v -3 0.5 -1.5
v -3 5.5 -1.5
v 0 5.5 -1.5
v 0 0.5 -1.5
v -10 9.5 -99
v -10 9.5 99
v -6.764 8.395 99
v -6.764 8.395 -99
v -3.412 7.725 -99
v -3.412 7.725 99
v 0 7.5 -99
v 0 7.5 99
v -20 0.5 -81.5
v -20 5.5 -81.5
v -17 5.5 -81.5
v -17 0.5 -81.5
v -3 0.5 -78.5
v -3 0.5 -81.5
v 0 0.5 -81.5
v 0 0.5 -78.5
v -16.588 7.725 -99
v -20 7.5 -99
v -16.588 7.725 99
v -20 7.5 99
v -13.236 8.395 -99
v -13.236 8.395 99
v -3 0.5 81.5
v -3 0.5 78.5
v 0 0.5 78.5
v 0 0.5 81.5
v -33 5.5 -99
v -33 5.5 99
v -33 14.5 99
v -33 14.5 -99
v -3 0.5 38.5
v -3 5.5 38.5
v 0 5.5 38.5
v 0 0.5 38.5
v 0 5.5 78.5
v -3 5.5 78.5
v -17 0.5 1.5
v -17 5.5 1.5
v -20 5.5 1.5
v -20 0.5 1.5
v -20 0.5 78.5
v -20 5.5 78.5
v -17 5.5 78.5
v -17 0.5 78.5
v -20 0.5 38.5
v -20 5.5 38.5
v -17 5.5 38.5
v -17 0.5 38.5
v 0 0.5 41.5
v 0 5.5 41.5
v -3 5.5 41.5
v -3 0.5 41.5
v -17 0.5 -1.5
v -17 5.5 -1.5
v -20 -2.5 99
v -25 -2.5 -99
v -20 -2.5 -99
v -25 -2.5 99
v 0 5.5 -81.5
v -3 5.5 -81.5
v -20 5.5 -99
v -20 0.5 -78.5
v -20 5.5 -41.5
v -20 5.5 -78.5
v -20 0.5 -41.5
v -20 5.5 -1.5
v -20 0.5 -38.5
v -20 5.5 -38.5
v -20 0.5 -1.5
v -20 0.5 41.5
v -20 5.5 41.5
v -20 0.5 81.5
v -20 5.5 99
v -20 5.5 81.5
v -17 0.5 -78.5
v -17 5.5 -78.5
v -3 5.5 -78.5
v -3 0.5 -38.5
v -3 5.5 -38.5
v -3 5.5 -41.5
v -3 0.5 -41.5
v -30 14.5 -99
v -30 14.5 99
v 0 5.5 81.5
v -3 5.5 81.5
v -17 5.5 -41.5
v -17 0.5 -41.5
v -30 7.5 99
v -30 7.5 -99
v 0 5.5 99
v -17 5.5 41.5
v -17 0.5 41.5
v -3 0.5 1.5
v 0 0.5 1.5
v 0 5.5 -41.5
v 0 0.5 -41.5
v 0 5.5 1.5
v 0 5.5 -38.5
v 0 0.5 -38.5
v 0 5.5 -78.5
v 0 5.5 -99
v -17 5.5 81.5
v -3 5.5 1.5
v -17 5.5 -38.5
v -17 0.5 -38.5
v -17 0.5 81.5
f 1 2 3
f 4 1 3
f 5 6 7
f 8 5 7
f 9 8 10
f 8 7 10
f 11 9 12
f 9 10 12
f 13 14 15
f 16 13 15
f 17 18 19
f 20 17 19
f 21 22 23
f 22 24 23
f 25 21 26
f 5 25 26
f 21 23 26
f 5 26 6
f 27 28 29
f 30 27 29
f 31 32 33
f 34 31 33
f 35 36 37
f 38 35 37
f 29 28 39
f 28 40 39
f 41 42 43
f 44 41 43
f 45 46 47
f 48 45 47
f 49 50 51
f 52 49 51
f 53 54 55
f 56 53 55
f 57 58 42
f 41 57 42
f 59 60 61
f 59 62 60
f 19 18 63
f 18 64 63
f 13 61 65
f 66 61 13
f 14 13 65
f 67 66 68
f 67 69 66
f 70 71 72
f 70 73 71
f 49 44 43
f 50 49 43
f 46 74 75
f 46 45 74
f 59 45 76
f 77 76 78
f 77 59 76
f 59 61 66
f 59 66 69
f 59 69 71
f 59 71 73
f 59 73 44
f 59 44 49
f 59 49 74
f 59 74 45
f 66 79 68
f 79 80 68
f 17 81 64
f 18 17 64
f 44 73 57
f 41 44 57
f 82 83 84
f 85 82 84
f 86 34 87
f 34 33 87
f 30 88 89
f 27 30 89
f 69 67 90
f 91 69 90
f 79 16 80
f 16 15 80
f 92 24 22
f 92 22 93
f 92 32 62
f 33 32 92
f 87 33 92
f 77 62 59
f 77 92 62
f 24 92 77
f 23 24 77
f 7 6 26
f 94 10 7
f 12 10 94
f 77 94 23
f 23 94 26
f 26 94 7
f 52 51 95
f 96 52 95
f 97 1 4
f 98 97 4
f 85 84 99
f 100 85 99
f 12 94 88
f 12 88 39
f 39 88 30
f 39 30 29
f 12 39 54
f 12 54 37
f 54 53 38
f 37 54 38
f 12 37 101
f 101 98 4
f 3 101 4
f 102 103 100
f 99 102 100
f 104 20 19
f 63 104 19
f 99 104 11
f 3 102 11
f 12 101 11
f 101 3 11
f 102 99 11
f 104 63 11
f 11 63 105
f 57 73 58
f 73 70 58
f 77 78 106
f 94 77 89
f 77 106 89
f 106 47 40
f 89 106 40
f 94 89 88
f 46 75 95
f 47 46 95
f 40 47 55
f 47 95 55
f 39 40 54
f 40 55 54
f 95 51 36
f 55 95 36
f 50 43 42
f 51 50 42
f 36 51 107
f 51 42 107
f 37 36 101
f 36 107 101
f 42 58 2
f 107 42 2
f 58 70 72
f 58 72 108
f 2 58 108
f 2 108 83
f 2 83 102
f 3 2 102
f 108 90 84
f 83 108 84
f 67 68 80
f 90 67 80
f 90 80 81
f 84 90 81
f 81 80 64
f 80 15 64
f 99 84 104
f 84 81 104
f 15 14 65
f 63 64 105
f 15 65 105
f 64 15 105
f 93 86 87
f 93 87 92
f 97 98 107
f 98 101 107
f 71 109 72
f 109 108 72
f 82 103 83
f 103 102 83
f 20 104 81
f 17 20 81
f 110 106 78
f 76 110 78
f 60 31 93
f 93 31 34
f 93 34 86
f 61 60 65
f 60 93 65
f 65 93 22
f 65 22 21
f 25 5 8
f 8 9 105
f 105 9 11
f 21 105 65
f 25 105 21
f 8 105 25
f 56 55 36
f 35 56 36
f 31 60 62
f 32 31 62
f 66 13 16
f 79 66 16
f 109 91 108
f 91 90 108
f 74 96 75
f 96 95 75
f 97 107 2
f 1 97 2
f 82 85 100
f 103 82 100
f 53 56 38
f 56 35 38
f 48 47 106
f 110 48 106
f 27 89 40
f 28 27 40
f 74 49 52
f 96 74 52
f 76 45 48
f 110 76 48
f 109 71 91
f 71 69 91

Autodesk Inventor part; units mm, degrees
ref_plane "YZ Plane" through (0, 0, 0) normal (1, 0, 0) x (0, 1, 0)
ref_plane "XZ Plane" through (0, 0, 0) normal (0, 1, 0) x (-1, 0, 0)
ref_plane "XY Plane" through (0, 0, 0) normal (0, 0, 1) x (1, 0, 0)
sketch "スケッチ1" plane through (0, 0, 0) normal (0, 1, 0) x (-1, 0, 0)
  line L0 (0, 99) -> (20, 99)
  line L1 (20, 99) -> (20, -99)
  line L2 (20, -99) -> (0, -99)
  line L3 (0, -99) -> (0, 99)
  line L4 (20, -99) -> (20, -109)
  line L5 (20, -109) -> (9, -109)
  line L6 (9, -109) -> (11, -99)
  line L7 (10.5, 99) -> (8.5, 88.5)
  line L8 (8.5, 88.5) -> (20, 88.5)
  point P0 (0, 0)
  point P1 (0, 0)
  point P2 (10, -99)
  point P3 (10, 99)
  dimension "d0" = 198
  dimension "d1" = 20
  dimension "d4" = 10
  dimension "d5" = 1
  dimension "d6" = 1
  dimension "d7" = 10.5
  dimension "d8" = 1.5
  dimension "d9" = 0.5
extrude "押し出し1" add sketch "スケッチ1" along normal blind 5.5 contours L0 L7 L8 L1 L2 L3 | L2 L4 L5 L6
sketch "スケッチ2" plane through (0, 5.5, 0) normal (0, 1, 0) x (1, 0, 0)
  line L0 (-20, 109) -> (-20, -88.5) projected
  line L1 (-20, -1.5) -> (-17, -1.5)
  line L2 (-17, -1.5) -> (-17, 1.5)
  line L3 (-17, 1.5) -> (-20, 1.5)
  line L4 (-20, 1.5) -> (-20, -1.5)
  line L5 (0, -99) -> (0, 99) projected
  line L6 (0, -1.5) -> (-3, -1.5)
  line L7 (-3, -1.5) -> (-3, 1.5)
  line L8 (-3, 1.5) -> (0, 1.5)
  line L9 (0, 1.5) -> (0, -1.5)
  point P0 (0, 0)
  point P1 (-17, 0)
  point P2 (0, 0)
  point P3 (0, 1.5)
  dimension "d10" = 3
  dimension "d11" = 3
extrude "押し出し2" cut sketch "スケッチ2" against normal through all
pattern_linear "矩形状パターン1" count 3 spacing 40 along (0, 0, -1) count 3 spacing 40 along (0, 0, 1) of "押し出し2"
sketch "スケッチ3" plane through (0, 5.5, 0) normal (0, 1, 0) x (1, 0, 0)
  line L0 (-20, -88.5) -> (-8.5, -88.5) projected
  line L1 (-20, -99) -> (0, -99)
  line L2 (0, -99) -> (0, 99)
  line L3 (-20, 109) -> (-20, -88.4991)
  line L4 (-20, -38.5) -> (-17, -38.5) projected
  line L5 (-17, -38.5) -> (-17, -41.5) projected
  line L6 (-17, -41.5) -> (-20, -41.5) projected
  line L7 (-20, -41.5) -> (-20, -78.5) projected
  line L8 (-20, -78.5) -> (-17, -78.5) projected
  line L9 (-17, -78.5) -> (-17, -81.5) projected
  line L10 (-17, -81.5) -> (-20, -81.5) projected
  line L11 (-20, -81.5) -> (-20, -88.5) projected
  line L12 (-20, -88.5) -> (-8.5, -88.5) projected
  line L13 (-8.5, -88.5) -> (-10.5, -99)
  line L14 (-10.5, -99) -> (0, -99) projected
  line L15 (0, -99) -> (0, -81.5) projected
  line L16 (0, -81.5) -> (-3, -81.5) projected
  line L17 (-3, -81.5) -> (-3, -78.5) projected
  line L18 (-3, -78.5) -> (0, -78.5) projected
  line L19 (0, -78.5) -> (0, -41.5) projected
  line L20 (0, -41.5) -> (-3, -41.5) projected
  line L21 (-3, -41.5) -> (-3, -38.5) projected
  line L22 (-3, -38.5) -> (0, -38.5) projected
  line L23 (0, -38.5) -> (0, -1.5) projected
  line L24 (0, -1.5) -> (-3, -1.5) projected
  line L25 (-3, -1.5) -> (-3, 1.5) projected
  line L26 (-3, 1.5) -> (0, 1.5) projected
  line L27 (0, 1.5) -> (0, 38.5) projected
  line L28 (0, 38.5) -> (-3, 38.5) projected
  line L29 (-3, 38.5) -> (-3, 41.5) projected
  line L30 (-3, 41.5) -> (0, 41.5) projected
  line L31 (0, 41.5) -> (0, 78.5) projected
  line L32 (0, 78.5) -> (-3, 78.5) projected
  line L33 (-3, 78.5) -> (-3, 81.5) projected
  line L34 (-3, 81.5) -> (0, 81.5) projected
  line L35 (0, 81.5) -> (0, 99) projected
  line L36 (-9, 109) -> (-20, 109) projected
  line L37 (-20, 109) -> (-20, 81.5) projected
  line L38 (-20, 81.5) -> (-17, 81.5) projected
  line L39 (-17, 81.5) -> (-17, 78.5) projected
  line L40 (-17, 78.5) -> (-20, 78.5) projected
  line L41 (-20, 78.5) -> (-20, 41.5) projected
  line L42 (-20, 41.5) -> (-17, 41.5) projected
  line L43 (-17, 41.5) -> (-17, 38.5) projected
  line L44 (-17, 38.5) -> (-20, 38.5) projected
  line L45 (-20, 38.5) -> (-20, 1.5) projected
  line L46 (-20, 1.5) -> (-17, 1.5) projected
  line L47 (-17, 1.5) -> (-17, -1.5) projected
  line L48 (-17, -1.5) -> (-20, -1.5) projected
  line L49 (-20, -1.5) -> (-20, -38.5) projected
  line L50 (-20, 109) -> (-20, 81.5) projected
  line L51 (-20, -99) -> (-20, -88.4991)
  line L52 (-9, 109) -> (0, 109)
  line L53 (0, 99) -> (0, 109)
  line L54 (0, 99) -> (-20, 99)
  point P0 (0, 0)
  point P1 (-11, 99)
  point P2 (0, -78.5)
  point P3 (0, -38.5)
  point P4 (0, 41.5)
  point P5 (0, 81.5)
  point P6 (-20, -88.4991)
extrude "押し出し3" cut sketch "スケッチ3" against normal through all contours L3 L10 L9 L8 L6 L5 L4 L48 L47 L46 L44 L43 L42 L40 L39 L38 L54 L2 L34 L33 L32 L30 L29 L28 L26 L25 L24 L22 L21 L20 L18 L17 L16 L1 L13 L0 | L3 L8 L9 L10 | L3 L4 L5 L6 | L16 L17 L18 L2 | L3 L46 L47 L48 | L20 L21 L22 L2 | L3 L42 L43 L44 | L24 L25 L26 L2 | L3 L38 L39 L40 | L28 L29 L30 L2 | L3 L36 L52 L53 L54 | L32 L33 L34 L2
extrude "押し出し4" add sketch "スケッチ3" against normal blind 5 contours L3 L8 L9 L10 | L3 L4 L5 L6 | L16 L17 L18 L2 | L3 L46 L47 L48 | L20 L21 L22 L2 | L3 L42 L43 L44 | L24 L25 L26 L2 | L3 L38 L39 L40 | L28 L29 L30 L2 | L32 L33 L34 L2
extrude "押し出し5" add sketch "スケッチ3" along normal blind 2 contours L3 L10 L9 L8 L6 L5 L4 L48 L47 L46 L44 L43 L42 L40 L39 L38 L54 L2 L34 L33 L32 L30 L29 L28 L26 L25 L24 L22 L21 L20 L18 L17 L16 L1 L13 L0 | L0 L13 L1 L51 | L3 L8 L9 L10 | L3 L4 L5 L6 | L16 L17 L18 L2 | L3 L46 L47 L48 | L20 L21 L22 L2 | L3 L42 L43 L44 | L24 L25 L26 L2 | L3 L38 L39 L40 | L28 L29 L30 L2 | L32 L33 L34 L2
sketch "スケッチ4" plane through (-20, 5.5, 99) normal (0, 0, 1) x (1, 0, 0)
  arc A0 (0, 2) -> (10, 4) centre (0, 28) ccw
  line L0 (0, 2) -> (20, 2) projected
  arc A1 (10, 4) -> (20, 2) centre (20, 28) ccw
  line L1 (10, 4) -> (10, 2) construction
  point P0 (20, -5.5)
  point P1 (14.6904, 2)
  point P2 (5.3096, 2)
  dimension "d27" = 2
extrude "押し出し6" add sketch "スケッチ4" against normal up to surface (198 mm away)
sketch "スケッチ8" plane through (-20, 5.5, 99) normal (0, 0, 1) x (1, 0, 0)
  arc A0 (0, 2) -> (10, 4) centre (0, 28) ccw projected
  line L0 (0, 2) -> (-10, 2)
  line L1 (-10, 2) -> (-10, -8)
  line L2 (-10, -8) -> (0, -8)
  line L3 (0, -8) -> (0, 2)
  line L4 (-10, -8) -> (-13, -8)
  line L5 (-13, -8) -> (-13, 9)
  line L6 (-13, 9) -> (-10, 9)
  line L7 (-10, 9) -> (-10, -8)
  point P0 (20, -5.5)
  dimension "d44" = 7
  dimension "d45" = 3
  dimension "d46" = 10
  dimension "d47" = 10
extrude "押し出し9" add sketch "スケッチ8" against normal up to surface (198 mm away)
chamfer "面取り3" distance 8 angle 45 1 edges at (-33, -2.5, 0)
properties part number "front_rail"
